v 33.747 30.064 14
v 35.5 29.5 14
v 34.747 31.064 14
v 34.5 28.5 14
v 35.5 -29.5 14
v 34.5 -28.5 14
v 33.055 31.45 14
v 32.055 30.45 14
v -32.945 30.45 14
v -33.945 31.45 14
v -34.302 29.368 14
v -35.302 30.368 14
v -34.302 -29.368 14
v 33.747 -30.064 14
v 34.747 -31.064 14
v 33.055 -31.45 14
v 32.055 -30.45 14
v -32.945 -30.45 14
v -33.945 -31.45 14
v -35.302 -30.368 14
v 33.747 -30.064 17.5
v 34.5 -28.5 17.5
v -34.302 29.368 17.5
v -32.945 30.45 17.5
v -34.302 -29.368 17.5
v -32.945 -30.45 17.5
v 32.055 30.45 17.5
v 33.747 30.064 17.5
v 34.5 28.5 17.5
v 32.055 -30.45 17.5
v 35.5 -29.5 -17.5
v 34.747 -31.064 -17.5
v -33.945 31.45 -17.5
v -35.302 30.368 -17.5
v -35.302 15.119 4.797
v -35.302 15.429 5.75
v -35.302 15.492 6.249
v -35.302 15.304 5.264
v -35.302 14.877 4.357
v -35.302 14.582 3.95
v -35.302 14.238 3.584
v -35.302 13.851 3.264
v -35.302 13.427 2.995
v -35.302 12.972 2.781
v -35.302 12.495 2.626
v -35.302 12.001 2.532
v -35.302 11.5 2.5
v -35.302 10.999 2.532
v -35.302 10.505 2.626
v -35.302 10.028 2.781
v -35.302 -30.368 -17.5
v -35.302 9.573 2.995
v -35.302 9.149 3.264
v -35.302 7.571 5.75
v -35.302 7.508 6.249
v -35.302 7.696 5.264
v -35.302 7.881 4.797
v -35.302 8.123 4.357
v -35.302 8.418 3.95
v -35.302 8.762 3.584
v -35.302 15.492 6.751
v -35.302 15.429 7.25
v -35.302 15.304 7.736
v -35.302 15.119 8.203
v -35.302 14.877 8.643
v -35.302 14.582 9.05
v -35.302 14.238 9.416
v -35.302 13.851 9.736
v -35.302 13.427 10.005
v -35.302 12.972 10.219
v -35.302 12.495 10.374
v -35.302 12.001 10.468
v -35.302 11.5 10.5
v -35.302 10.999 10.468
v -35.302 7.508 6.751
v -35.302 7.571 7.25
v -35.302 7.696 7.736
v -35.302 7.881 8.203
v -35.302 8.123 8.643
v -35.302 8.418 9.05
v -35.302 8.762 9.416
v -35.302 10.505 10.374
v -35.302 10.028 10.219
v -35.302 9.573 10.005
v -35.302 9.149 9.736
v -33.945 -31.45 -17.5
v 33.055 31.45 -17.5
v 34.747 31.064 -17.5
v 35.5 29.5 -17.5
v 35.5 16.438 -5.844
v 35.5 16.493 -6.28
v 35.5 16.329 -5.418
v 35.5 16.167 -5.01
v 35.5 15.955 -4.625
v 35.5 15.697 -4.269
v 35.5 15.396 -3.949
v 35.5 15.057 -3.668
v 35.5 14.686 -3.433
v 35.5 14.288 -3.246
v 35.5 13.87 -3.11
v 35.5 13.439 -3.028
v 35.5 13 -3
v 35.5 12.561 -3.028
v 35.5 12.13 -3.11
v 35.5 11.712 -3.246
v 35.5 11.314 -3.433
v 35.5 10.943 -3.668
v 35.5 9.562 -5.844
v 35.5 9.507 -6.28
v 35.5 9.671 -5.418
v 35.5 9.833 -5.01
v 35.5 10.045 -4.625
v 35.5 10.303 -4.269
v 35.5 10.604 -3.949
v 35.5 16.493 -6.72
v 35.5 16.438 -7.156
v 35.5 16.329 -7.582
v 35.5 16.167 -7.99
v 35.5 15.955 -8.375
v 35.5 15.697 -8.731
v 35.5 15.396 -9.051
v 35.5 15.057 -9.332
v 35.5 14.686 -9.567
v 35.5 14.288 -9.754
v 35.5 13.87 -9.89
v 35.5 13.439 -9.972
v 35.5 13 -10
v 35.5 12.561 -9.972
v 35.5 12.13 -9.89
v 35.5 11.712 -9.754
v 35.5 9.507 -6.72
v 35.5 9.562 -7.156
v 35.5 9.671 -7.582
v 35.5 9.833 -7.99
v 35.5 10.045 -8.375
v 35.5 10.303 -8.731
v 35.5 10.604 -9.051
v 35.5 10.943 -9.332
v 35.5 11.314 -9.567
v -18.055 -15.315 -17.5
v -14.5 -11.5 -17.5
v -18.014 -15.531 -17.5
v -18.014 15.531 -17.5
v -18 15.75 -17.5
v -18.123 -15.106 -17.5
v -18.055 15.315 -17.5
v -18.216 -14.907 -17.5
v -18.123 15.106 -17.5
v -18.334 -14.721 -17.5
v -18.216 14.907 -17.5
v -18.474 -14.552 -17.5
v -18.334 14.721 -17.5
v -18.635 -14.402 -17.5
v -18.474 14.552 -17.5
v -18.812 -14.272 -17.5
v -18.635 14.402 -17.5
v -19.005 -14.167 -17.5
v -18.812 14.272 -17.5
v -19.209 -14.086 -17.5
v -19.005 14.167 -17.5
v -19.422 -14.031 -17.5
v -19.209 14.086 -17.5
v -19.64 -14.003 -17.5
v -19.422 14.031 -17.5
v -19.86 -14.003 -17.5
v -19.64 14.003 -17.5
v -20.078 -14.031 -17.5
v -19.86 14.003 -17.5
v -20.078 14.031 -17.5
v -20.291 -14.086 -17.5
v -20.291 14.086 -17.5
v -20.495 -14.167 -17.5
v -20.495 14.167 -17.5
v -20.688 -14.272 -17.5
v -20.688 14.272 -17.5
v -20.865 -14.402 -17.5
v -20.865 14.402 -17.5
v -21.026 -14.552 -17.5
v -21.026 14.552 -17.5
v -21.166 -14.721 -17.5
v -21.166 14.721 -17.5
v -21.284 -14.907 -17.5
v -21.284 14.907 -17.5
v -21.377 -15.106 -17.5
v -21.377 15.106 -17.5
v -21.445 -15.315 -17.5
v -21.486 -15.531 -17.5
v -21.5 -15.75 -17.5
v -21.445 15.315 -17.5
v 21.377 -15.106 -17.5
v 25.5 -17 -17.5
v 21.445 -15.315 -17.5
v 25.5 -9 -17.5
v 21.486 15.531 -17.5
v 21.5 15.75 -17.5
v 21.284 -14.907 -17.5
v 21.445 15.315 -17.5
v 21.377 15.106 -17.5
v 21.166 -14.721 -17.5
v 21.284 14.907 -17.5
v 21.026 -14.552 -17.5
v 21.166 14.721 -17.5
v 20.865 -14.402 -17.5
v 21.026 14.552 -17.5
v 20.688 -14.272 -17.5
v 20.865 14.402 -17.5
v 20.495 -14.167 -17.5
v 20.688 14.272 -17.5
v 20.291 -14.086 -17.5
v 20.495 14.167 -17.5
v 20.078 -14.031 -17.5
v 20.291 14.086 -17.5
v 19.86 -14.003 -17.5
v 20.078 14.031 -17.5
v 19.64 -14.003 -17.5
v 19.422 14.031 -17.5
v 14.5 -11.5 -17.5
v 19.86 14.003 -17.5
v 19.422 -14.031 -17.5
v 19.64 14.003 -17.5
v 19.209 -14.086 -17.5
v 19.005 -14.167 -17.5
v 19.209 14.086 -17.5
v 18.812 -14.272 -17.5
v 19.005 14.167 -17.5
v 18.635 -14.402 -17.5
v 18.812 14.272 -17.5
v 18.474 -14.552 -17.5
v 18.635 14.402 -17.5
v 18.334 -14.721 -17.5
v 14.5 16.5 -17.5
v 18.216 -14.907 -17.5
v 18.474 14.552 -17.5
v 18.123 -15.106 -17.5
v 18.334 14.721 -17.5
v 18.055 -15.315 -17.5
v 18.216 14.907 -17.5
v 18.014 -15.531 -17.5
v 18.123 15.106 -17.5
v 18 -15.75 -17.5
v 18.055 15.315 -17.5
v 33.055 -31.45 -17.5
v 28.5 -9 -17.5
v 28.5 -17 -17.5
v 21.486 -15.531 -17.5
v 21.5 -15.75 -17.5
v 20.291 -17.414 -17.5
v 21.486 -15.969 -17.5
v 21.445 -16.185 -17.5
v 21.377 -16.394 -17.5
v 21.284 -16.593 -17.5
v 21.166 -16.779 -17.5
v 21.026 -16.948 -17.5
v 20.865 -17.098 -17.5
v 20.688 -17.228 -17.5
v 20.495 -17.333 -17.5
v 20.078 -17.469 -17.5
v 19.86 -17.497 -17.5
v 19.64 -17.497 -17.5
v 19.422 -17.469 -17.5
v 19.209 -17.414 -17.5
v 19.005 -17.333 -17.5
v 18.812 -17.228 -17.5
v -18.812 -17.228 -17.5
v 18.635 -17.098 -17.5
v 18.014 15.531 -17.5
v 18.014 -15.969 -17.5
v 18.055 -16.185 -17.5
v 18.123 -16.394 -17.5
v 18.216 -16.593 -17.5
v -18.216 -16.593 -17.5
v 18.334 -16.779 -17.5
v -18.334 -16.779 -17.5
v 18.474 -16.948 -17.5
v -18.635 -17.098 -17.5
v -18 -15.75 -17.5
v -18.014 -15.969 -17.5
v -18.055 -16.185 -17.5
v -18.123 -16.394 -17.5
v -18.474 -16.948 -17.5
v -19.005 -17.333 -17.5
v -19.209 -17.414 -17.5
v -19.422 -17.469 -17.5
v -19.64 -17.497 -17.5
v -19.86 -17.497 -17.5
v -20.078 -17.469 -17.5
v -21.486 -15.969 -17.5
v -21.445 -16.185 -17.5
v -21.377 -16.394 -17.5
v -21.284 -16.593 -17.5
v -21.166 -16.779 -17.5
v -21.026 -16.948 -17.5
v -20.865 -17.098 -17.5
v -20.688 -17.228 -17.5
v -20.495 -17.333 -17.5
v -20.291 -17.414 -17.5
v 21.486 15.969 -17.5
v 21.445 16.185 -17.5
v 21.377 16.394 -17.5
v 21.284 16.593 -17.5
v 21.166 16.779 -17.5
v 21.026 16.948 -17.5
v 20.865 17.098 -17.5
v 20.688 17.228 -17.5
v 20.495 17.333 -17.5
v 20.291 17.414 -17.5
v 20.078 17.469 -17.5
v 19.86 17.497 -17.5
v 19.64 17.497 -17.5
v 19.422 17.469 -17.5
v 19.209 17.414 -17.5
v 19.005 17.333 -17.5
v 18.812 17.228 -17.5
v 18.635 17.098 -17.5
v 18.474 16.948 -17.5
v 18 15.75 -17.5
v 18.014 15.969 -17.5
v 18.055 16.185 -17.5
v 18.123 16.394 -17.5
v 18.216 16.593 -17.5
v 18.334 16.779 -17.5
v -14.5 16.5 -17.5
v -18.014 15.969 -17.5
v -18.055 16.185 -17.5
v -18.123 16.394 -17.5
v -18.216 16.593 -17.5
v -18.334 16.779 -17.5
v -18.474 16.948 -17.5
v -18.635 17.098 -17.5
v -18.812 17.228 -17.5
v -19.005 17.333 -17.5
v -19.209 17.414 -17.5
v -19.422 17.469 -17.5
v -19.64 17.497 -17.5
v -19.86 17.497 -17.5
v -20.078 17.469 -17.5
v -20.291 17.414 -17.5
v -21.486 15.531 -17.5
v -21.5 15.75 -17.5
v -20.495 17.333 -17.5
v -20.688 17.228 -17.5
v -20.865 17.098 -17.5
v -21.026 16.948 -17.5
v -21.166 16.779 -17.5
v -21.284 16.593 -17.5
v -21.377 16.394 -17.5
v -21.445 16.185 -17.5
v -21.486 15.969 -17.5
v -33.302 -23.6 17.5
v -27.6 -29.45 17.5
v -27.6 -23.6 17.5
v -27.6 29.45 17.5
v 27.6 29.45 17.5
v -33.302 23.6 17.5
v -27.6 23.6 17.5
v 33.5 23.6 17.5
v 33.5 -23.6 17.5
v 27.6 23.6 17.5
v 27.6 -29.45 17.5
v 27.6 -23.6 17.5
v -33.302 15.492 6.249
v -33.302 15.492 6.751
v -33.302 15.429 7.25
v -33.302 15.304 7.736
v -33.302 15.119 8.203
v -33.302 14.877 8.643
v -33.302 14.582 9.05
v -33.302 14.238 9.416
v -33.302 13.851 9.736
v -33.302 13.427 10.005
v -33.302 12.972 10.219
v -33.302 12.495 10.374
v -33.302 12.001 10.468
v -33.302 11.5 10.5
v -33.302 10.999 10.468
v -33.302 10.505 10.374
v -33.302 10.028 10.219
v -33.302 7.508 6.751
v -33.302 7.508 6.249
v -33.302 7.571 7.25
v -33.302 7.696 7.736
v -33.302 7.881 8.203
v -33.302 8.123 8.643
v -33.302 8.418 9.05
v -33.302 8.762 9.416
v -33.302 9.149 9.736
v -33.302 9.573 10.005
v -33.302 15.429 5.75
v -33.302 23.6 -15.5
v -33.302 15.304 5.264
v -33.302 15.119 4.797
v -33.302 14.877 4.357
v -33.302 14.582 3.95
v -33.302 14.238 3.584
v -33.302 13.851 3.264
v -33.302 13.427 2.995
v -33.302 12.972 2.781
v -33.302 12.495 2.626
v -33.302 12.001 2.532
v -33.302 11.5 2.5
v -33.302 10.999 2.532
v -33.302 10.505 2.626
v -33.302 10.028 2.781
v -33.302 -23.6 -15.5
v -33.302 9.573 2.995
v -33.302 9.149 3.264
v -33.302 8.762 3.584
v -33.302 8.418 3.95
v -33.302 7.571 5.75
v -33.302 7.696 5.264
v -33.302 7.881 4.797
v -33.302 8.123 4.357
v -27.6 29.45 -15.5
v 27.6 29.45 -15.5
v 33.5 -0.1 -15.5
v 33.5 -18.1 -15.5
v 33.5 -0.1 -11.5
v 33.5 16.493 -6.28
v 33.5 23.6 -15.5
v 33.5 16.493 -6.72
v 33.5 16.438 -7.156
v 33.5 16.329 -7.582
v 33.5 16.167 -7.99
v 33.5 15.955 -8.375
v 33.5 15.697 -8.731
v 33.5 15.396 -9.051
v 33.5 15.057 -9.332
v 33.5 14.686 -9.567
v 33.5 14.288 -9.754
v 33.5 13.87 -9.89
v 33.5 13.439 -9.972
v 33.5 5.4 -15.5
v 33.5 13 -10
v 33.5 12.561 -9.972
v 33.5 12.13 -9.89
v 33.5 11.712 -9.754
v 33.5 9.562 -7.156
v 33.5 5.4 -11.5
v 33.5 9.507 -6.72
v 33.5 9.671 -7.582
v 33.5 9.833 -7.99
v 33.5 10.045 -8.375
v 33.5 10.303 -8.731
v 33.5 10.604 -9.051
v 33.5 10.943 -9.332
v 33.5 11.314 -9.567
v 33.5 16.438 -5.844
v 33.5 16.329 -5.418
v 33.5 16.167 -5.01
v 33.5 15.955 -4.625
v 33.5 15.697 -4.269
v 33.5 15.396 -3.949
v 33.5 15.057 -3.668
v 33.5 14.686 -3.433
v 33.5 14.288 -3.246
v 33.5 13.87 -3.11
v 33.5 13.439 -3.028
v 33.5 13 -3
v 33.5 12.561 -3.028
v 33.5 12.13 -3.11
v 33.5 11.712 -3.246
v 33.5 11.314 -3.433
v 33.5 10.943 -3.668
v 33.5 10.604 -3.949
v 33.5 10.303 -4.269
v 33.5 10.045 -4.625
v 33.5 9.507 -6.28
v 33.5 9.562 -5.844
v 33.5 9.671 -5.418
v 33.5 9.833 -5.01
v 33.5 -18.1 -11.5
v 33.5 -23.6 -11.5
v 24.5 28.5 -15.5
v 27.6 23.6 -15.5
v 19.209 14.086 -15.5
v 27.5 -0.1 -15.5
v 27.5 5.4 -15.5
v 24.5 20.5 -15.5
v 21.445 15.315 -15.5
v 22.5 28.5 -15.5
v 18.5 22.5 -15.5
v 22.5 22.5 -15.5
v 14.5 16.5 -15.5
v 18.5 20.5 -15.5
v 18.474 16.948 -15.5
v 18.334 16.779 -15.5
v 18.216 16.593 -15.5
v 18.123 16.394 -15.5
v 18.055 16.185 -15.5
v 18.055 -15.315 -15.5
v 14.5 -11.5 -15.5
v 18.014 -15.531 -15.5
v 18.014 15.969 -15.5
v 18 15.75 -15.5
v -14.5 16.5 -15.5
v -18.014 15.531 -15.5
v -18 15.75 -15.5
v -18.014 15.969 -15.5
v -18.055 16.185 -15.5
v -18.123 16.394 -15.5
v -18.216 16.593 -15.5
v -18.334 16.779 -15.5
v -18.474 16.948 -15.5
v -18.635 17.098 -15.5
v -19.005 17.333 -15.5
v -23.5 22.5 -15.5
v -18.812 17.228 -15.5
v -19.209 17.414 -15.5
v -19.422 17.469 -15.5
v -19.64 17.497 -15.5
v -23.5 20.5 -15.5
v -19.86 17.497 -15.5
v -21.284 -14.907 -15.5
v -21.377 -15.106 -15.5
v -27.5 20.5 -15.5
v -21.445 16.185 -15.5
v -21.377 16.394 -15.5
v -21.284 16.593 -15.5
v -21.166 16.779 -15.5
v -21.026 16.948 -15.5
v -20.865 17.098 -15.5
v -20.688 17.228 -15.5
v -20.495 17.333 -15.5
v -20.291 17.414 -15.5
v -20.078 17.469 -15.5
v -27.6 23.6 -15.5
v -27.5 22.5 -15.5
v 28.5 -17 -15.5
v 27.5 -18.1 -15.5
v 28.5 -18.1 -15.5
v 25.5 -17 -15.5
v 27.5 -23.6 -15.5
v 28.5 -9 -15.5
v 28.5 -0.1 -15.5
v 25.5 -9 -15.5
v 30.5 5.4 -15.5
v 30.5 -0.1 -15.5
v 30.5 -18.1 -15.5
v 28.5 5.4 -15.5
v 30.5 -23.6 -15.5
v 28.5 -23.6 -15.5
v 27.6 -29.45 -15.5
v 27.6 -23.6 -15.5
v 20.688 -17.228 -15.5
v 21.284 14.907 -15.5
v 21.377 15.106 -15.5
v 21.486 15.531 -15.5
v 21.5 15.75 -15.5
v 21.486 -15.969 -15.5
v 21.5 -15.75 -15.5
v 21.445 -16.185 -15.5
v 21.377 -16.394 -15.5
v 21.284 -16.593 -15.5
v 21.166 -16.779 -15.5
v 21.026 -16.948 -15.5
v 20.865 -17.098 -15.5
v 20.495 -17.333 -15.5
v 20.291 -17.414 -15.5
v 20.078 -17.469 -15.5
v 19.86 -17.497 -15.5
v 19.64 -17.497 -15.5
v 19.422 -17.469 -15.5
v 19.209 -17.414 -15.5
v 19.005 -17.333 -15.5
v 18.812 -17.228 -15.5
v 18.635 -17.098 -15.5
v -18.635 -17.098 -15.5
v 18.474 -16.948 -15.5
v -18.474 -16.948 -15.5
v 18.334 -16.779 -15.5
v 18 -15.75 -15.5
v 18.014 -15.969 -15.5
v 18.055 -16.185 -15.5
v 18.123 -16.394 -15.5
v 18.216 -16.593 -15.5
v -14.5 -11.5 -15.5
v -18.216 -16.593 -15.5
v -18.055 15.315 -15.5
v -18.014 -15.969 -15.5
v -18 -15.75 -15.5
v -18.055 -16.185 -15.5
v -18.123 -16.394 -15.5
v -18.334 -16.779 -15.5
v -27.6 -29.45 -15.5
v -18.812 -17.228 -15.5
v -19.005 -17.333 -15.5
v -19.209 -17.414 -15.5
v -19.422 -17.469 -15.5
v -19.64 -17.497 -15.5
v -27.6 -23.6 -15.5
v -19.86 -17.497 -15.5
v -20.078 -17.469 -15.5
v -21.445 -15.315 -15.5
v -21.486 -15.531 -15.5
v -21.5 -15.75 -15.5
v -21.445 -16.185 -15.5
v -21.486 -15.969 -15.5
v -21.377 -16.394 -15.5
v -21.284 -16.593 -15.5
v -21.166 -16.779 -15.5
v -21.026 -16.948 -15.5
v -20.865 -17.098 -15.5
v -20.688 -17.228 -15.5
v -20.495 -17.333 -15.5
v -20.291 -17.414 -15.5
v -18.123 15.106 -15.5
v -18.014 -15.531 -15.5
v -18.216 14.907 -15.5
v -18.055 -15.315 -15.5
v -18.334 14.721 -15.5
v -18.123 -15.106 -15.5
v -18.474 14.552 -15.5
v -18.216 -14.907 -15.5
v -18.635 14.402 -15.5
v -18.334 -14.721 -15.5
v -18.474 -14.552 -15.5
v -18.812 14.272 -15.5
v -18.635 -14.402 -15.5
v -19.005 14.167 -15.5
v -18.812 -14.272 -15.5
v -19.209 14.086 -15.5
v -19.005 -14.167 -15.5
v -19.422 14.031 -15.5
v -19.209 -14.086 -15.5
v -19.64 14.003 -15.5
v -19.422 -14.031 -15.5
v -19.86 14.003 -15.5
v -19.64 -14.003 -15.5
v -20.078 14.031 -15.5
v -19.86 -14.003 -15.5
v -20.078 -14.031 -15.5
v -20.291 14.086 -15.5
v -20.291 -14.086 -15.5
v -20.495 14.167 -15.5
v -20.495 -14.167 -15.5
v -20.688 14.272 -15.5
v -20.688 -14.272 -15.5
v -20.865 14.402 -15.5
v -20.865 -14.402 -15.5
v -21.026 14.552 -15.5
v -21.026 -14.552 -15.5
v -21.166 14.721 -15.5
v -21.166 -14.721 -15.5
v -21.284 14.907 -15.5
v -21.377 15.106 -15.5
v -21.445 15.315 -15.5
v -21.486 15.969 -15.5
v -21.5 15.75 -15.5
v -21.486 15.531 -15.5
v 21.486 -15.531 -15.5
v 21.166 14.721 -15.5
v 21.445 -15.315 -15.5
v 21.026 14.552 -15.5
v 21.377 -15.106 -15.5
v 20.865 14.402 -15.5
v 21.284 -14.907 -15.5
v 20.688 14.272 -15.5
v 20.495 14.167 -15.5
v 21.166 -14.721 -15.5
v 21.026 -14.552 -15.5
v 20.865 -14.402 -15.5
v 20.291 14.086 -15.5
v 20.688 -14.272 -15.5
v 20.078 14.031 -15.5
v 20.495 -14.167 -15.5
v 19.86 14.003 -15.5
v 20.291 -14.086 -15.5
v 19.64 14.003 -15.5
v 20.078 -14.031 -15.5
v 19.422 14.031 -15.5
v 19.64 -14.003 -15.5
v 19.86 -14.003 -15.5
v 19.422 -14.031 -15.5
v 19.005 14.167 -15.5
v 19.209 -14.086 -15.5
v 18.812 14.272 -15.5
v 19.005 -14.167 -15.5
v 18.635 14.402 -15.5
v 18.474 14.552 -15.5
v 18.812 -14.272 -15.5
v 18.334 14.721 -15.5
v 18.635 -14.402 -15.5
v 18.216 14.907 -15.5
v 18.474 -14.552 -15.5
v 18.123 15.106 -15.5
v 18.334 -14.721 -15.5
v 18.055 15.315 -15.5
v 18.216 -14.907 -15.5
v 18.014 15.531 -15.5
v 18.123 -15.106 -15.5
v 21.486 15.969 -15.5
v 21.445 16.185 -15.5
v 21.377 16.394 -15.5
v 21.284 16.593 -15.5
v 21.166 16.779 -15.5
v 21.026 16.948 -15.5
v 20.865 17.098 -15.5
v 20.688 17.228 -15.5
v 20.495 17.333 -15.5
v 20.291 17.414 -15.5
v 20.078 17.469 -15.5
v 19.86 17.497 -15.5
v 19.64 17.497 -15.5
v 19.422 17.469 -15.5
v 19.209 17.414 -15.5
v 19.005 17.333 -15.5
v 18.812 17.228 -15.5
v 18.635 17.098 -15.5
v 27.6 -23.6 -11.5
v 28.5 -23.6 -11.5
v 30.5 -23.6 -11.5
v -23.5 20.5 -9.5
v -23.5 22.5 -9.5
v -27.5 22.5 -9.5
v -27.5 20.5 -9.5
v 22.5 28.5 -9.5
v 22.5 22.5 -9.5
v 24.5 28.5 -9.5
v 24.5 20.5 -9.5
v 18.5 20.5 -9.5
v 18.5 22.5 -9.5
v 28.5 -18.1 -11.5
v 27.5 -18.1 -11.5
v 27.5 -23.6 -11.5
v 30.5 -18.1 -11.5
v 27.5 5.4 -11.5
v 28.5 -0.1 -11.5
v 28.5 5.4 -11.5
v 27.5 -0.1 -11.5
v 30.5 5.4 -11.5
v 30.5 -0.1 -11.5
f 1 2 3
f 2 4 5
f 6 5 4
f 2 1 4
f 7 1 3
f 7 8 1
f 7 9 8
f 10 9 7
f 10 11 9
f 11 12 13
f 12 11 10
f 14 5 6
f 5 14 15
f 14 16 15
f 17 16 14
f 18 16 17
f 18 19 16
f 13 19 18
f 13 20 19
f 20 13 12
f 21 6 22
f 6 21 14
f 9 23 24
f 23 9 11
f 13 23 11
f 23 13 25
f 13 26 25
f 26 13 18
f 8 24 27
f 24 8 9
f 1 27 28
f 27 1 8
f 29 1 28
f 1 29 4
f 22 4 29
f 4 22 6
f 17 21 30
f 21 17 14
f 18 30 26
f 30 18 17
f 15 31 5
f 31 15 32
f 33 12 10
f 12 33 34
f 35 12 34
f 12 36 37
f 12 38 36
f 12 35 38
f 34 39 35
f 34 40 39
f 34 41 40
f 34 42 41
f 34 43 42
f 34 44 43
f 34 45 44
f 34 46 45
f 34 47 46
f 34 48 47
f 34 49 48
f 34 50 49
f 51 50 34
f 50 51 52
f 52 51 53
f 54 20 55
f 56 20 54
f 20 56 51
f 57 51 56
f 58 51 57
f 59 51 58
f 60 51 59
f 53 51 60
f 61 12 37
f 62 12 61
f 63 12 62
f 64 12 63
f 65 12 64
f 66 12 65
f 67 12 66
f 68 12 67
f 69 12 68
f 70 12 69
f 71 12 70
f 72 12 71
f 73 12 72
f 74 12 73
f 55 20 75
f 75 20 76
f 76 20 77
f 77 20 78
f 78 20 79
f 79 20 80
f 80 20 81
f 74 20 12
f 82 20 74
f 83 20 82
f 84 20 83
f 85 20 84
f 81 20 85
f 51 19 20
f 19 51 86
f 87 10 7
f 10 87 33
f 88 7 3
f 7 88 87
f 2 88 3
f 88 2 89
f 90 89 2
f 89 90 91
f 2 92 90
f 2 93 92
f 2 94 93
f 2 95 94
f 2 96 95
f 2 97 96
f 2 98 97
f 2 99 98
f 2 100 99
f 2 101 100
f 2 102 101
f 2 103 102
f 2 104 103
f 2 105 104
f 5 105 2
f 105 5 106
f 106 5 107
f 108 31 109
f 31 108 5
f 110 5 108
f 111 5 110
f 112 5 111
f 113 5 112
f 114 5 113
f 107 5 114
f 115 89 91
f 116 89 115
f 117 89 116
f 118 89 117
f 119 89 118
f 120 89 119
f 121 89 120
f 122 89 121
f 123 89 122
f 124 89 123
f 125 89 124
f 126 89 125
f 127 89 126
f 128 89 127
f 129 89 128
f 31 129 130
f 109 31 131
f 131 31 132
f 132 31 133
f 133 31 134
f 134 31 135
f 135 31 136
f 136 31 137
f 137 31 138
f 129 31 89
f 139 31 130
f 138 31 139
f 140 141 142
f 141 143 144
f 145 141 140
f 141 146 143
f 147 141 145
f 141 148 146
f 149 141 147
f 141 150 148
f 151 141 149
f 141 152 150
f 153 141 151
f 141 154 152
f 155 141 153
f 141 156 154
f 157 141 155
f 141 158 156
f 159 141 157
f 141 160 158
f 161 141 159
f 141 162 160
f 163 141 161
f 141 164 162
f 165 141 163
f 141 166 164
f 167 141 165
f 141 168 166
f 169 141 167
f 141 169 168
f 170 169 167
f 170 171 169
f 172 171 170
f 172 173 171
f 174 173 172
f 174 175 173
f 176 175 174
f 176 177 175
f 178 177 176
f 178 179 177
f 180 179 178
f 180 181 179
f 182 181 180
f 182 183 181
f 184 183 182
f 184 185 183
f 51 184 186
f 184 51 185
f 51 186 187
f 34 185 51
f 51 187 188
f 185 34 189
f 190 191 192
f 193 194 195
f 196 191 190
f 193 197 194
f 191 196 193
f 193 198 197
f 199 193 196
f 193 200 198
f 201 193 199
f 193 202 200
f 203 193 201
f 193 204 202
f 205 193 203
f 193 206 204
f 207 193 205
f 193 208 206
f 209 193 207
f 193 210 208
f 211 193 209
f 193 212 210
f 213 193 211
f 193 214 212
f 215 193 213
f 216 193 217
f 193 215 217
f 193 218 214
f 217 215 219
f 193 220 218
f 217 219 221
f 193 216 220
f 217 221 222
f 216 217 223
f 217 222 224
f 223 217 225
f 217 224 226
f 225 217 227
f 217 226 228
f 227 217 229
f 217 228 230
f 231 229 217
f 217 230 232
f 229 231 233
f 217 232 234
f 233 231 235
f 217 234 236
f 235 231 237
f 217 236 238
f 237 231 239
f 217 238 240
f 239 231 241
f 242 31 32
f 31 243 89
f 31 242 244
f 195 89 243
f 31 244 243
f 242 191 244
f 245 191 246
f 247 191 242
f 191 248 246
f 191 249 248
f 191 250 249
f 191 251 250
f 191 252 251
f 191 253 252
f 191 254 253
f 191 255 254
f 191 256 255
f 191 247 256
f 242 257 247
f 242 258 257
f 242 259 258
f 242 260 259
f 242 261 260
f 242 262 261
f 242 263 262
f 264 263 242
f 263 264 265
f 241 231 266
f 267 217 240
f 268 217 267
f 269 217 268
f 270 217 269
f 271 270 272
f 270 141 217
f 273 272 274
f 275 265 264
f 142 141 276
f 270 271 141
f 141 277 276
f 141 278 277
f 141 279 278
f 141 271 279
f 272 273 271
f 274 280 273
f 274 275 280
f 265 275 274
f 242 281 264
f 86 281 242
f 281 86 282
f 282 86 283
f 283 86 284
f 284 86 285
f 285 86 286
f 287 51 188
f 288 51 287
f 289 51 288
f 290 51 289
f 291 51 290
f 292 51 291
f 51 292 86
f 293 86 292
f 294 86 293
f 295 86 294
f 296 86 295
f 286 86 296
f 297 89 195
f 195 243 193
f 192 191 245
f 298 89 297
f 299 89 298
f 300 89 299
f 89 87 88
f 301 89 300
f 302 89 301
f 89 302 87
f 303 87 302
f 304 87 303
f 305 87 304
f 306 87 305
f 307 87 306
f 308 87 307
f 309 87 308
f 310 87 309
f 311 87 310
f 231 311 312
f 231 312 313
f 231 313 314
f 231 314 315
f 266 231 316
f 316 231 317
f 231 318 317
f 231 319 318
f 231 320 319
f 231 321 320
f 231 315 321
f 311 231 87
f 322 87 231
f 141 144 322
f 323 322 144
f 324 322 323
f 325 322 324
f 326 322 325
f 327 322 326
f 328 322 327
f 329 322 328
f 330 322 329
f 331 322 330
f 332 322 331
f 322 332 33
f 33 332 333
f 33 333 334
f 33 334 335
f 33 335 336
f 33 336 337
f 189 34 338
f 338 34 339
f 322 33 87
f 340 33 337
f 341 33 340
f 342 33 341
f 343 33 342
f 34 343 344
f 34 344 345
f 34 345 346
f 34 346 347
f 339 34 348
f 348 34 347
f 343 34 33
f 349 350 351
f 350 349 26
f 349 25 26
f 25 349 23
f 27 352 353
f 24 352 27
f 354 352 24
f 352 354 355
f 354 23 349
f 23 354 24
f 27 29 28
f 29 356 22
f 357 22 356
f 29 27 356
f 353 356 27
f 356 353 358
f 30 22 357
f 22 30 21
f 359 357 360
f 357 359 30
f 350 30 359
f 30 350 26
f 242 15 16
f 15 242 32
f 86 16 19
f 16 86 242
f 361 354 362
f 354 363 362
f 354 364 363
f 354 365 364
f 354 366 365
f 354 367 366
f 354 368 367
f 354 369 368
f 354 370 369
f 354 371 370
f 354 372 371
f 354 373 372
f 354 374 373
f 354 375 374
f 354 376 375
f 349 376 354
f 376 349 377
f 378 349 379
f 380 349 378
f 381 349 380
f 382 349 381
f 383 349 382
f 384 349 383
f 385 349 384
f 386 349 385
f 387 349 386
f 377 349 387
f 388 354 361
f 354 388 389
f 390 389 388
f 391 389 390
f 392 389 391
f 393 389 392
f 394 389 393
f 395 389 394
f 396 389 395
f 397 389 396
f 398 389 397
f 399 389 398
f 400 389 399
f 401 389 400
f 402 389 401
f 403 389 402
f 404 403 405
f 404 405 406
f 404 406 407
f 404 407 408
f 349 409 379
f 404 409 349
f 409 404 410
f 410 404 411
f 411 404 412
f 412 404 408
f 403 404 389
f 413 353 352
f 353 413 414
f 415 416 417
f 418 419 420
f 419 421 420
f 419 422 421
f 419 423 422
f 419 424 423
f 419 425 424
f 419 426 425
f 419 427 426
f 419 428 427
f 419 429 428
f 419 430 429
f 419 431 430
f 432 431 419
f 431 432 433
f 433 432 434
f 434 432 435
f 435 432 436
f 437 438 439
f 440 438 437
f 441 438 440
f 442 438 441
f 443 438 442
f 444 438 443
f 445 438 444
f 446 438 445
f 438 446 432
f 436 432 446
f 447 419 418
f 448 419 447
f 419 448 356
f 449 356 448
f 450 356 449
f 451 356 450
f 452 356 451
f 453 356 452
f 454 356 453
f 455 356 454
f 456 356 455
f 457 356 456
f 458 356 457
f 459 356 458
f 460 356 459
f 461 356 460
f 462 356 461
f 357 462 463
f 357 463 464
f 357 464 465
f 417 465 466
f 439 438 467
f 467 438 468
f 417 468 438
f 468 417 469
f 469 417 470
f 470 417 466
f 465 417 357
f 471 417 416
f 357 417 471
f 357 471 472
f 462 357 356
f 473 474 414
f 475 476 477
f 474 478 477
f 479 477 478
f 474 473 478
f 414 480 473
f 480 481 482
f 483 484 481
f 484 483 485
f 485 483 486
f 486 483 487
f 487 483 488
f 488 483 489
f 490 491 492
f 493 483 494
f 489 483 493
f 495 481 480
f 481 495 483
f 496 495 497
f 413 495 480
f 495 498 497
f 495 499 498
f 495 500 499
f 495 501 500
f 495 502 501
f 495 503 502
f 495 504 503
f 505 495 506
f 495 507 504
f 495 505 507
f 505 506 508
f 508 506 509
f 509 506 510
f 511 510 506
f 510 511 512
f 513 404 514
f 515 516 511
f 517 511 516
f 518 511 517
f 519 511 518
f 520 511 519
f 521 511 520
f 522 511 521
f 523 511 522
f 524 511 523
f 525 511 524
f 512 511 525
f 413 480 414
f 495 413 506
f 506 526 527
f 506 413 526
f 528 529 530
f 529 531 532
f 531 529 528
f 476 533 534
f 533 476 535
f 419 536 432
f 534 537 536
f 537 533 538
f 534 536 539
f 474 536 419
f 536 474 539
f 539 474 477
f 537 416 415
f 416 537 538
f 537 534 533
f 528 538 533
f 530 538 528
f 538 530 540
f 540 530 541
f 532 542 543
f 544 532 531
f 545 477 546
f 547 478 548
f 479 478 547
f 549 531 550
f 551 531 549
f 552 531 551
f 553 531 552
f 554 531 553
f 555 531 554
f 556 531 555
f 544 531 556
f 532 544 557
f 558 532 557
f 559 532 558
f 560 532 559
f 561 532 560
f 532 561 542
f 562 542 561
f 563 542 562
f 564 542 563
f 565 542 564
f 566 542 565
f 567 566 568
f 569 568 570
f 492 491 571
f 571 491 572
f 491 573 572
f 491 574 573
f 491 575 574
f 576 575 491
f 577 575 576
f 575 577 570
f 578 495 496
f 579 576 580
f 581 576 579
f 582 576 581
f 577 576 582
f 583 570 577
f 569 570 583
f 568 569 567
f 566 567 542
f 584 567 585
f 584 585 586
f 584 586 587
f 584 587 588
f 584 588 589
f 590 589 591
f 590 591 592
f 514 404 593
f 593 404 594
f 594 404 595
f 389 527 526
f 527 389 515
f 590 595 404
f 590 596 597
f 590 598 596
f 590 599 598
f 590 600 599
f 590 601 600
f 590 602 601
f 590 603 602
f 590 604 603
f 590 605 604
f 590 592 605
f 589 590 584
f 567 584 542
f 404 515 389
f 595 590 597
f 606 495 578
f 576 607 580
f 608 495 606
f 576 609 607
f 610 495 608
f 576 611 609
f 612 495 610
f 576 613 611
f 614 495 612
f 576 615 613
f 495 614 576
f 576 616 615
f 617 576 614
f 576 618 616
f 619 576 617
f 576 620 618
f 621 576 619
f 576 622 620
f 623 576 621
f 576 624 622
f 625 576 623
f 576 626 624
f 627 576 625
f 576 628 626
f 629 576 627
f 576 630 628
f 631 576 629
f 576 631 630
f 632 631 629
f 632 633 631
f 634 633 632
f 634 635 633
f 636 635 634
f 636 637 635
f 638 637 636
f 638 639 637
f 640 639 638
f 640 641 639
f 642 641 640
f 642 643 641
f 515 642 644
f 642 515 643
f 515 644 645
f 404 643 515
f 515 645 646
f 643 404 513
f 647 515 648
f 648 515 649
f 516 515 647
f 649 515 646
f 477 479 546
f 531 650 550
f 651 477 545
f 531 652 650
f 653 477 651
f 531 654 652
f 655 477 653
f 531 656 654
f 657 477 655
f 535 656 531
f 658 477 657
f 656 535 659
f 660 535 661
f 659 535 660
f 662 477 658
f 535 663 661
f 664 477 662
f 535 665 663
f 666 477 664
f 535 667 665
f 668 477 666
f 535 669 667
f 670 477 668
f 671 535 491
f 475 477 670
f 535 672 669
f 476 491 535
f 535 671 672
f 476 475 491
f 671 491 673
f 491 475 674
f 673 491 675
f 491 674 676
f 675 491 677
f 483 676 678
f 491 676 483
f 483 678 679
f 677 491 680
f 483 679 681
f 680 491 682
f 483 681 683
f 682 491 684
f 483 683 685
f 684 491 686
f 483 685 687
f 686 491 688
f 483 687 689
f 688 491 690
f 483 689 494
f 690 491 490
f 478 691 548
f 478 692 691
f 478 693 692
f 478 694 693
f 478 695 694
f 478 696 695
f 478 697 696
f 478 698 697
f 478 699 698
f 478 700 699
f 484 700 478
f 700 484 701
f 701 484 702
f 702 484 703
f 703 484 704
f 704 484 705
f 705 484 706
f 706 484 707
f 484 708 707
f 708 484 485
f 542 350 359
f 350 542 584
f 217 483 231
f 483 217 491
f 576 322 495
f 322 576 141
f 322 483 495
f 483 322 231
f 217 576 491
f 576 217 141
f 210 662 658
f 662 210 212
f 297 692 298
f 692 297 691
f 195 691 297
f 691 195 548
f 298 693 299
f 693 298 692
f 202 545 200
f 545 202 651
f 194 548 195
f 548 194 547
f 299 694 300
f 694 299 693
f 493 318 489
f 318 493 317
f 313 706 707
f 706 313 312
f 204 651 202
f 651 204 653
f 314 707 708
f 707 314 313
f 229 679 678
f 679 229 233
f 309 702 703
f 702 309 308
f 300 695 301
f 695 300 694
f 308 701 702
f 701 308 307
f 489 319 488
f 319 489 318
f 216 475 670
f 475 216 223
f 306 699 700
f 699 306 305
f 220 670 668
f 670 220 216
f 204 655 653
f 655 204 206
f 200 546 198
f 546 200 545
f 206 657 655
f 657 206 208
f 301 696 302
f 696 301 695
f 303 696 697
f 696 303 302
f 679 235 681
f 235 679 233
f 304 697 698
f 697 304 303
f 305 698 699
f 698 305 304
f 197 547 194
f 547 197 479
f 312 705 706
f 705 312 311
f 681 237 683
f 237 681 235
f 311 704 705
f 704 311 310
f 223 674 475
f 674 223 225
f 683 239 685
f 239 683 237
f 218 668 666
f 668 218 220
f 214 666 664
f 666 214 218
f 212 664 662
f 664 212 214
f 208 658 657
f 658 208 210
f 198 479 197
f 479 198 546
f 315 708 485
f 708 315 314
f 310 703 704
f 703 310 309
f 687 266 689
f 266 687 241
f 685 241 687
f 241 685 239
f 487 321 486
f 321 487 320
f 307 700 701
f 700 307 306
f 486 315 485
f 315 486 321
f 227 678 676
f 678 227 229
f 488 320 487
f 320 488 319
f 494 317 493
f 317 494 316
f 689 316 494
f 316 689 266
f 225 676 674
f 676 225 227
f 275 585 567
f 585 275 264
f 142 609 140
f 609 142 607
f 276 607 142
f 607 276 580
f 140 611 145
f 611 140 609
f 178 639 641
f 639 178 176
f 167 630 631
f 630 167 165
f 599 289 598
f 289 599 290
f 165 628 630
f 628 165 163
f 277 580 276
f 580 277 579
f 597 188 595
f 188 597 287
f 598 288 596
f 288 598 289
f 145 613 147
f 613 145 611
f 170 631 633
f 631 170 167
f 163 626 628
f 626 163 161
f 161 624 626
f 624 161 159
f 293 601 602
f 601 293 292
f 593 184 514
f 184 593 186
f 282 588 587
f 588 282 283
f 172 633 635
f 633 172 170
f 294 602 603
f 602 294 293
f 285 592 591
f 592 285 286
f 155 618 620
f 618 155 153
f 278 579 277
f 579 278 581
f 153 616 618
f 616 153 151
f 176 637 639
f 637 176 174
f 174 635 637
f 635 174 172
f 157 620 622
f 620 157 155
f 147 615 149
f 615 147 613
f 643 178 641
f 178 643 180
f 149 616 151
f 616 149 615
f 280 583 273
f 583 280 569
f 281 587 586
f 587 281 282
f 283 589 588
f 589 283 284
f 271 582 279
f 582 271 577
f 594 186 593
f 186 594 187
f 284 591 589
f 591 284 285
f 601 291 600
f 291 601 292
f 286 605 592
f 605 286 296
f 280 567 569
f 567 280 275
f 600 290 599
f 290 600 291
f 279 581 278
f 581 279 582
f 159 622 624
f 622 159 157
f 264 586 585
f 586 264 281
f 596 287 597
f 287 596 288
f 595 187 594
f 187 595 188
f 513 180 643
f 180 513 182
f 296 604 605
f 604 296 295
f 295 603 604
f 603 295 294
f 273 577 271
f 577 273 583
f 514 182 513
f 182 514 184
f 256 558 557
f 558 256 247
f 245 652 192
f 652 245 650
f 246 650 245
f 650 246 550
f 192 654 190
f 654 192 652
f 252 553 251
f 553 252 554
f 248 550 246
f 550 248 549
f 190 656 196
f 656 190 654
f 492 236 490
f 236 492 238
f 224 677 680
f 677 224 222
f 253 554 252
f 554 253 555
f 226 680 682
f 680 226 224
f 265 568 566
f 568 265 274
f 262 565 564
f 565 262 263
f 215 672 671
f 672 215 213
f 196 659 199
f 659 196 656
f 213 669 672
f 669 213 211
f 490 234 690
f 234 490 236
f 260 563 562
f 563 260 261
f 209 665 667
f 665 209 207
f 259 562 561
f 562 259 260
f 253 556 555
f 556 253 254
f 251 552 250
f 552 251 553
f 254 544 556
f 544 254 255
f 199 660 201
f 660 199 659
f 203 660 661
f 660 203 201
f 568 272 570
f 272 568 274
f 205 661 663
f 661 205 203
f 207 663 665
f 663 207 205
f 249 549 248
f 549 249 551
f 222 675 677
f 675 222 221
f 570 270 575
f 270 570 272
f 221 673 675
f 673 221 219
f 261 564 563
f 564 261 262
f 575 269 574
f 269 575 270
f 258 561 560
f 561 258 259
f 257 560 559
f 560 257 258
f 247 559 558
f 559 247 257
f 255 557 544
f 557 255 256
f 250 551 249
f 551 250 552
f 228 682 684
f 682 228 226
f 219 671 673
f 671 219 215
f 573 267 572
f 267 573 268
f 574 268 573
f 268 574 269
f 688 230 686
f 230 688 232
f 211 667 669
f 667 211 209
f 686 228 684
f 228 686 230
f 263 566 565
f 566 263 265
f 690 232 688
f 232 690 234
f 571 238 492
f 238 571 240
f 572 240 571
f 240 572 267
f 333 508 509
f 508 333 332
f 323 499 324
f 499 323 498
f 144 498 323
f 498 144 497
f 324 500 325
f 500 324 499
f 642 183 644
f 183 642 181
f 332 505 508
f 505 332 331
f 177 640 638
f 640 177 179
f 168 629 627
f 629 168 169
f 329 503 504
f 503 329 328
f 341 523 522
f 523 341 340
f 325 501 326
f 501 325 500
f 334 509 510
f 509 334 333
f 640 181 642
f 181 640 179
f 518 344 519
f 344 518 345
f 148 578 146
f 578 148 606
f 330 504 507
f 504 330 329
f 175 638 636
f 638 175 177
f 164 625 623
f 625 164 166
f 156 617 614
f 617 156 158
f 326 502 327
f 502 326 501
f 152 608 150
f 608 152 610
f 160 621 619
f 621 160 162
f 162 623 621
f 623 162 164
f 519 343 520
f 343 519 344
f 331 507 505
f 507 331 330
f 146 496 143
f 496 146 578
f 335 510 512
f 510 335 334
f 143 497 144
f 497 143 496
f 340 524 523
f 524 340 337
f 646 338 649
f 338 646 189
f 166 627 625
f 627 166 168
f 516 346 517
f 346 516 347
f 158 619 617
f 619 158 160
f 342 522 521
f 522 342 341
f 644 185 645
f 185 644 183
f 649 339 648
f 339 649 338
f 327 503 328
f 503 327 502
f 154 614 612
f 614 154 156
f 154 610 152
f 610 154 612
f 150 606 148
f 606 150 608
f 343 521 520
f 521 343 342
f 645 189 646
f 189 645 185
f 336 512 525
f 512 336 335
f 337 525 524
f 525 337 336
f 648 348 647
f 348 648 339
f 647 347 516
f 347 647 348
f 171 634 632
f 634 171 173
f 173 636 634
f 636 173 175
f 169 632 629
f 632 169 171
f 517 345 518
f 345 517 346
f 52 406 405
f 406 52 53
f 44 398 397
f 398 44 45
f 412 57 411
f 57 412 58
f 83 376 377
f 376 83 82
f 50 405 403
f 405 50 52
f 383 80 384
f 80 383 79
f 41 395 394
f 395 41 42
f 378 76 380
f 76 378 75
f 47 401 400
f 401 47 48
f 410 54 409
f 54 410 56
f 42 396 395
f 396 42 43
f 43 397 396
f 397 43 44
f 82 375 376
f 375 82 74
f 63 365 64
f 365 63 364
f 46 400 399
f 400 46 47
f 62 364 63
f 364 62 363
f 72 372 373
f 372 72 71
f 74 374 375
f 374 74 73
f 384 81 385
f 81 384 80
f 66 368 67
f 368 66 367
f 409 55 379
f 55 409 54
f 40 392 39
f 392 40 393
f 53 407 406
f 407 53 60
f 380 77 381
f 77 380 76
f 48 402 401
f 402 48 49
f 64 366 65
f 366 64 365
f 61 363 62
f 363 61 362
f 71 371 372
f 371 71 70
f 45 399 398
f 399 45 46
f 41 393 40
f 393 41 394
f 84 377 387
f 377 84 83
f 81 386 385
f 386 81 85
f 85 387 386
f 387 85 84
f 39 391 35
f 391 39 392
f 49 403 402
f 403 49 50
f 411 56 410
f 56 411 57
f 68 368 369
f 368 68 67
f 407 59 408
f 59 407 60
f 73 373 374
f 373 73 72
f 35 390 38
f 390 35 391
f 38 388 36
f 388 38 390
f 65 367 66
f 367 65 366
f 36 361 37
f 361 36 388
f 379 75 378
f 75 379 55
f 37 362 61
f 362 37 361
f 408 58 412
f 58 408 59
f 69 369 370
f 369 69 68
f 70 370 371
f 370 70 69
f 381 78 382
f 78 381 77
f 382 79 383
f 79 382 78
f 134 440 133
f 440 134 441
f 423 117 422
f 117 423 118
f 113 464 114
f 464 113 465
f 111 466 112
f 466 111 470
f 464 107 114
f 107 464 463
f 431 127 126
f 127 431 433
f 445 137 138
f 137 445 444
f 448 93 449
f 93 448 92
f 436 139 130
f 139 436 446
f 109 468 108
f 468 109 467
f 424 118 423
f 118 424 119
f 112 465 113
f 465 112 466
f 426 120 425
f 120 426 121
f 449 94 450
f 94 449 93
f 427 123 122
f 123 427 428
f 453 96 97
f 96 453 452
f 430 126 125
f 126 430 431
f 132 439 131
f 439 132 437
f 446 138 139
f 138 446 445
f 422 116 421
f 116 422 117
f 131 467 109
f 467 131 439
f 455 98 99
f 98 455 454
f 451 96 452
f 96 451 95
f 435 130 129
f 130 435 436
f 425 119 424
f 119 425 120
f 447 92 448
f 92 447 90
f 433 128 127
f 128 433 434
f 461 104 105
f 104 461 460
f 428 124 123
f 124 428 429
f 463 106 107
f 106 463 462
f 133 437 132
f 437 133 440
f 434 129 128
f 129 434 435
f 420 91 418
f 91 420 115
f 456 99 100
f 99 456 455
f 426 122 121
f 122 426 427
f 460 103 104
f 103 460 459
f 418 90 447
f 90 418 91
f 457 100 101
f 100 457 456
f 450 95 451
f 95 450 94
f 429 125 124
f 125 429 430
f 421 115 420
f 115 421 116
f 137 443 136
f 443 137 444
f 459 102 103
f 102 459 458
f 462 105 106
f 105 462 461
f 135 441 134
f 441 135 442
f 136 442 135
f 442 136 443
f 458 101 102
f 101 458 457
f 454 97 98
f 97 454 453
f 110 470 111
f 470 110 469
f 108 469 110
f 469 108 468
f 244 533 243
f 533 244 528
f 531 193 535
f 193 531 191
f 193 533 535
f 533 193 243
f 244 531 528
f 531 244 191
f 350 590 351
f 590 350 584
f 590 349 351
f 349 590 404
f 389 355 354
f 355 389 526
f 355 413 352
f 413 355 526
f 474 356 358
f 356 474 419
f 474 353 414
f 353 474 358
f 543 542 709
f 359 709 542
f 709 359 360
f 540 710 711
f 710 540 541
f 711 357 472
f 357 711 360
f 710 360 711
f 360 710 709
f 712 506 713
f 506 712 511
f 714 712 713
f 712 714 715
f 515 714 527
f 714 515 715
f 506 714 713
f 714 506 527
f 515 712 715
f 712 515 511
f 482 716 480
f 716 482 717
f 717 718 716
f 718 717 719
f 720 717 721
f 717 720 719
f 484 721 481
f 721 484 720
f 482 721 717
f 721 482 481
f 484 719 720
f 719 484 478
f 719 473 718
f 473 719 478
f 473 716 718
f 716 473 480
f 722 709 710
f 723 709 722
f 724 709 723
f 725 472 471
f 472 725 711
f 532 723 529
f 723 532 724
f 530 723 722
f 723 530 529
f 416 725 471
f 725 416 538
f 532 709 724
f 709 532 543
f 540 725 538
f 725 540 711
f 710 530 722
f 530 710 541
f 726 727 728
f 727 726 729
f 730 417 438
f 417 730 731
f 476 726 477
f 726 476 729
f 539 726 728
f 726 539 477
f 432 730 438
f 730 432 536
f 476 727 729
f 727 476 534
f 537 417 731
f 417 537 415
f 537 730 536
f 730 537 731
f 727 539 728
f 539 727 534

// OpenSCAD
module box(width, height, depth, thickness, endingThickness, endingDepth, rdiam) {
    difference() {
        roundedCube(width, height, depth, rdiam);
        translate([0, 0, thickness]) roundedCube(width - thickness * 2, height - thickness * 2, depth, rdiam);
        translate([0, 0, (depth - endingDepth) / 2])
        difference() {
            roundedCube(width + 1, height + 1, endingDepth + 1, rdiam);
            roundedCube(width - thickness * 2 + endingThickness * 2, height - thickness * 2 + endingThickness * 2, endingDepth + 1, rdiam);
        };
    };
    
        
}

module roundedCube(width, height, depth, diam) {
    dwidth = width - diam;
    dheight = height - diam;
    
    hull() {
        translate([- dwidth / 2, - dheight / 2, 0]) cylinder(h = depth, d = diam, center = true);
        translate([dwidth / 2, dheight / 2, 0]) cylinder(h = depth, d = diam, center = true);
        translate([- dwidth / 2, dheight / 2, 0]) cylinder(h = depth, d = diam, center = true);
        translate([dwidth / 2, - dheight / 2, 0]) cylinder(h = depth, d = diam, center = true);
    }
}

module screws(width, height, depth, diam, screw) {
    fuse = 0.1;
    
    translate([- (width - screw) / 2 - fuse, - (height - screw) / 2 - fuse, 0]) 
    screwSupport(screw, screw, depth, diam);
    
    rotate(-90) 
    translate([- (height - screw) / 2 - fuse, - (width - screw) / 2 - fuse, 0]) 
    screwSupport(screw, screw, depth, diam);
    
    rotate(-180) 
    translate([- (width - screw) / 2 - fuse, - (height - screw) / 2 - fuse, 0]) 
    screwSupport(screw, screw, depth, diam);
    
    rotate(-270) 
    translate([- (height - screw) / 2 - fuse, - (width - screw) / 2 - fuse, 0]) 
    screwSupport(screw, screw, depth, diam);
}

module screwSupport(width, height, depth, diam) {
    $fn = 50;
    
    dwidth = width - diam;
    dheight = height - diam;
    
    hull() {
        translate([- dwidth / 2, - dheight / 2, 0]) cylinder(h = depth, d = diam, center = true);
        translate([dwidth / 2, dheight / 2, 0]) cube([diam, diam, depth], center = true);
        translate([- dwidth / 2, dheight / 2, 0]) cube([diam, diam, depth], center = true);
        translate([dwidth / 2, - dheight / 2, 0]) cube([diam, diam, depth], center = true);
    }
    //cube([width, height, depth], center = true);
}

module battery(
    width, 
    height, 
    depth, 
    batteryWidth,
    batteryHeight,
    batteryThickness, 
    supportThickness,
    screw,
    depthOffset
) {
    pdepth = depth - depthOffset;
    supWidth = supportThickness * 2;
    supHeight = supportThickness;
    supDepth = supportThickness * 3;
    
    translate([
        - (width - supWidth) / 2 + screw, 
        + (height - supHeight) / 2 - batteryThickness, 
        - (depth - supDepth) / 2
    ])
    cube([supWidth, supHeight, supDepth], center = true);

    translate([
        - (width - supWidth) / 2 + screw + batteryWidth - supWidth, 
        + (height - supHeight) / 2 - batteryThickness, 
        - (depth - supDepth) / 2
    ])
    cube([supWidth, supHeight, supDepth], center = true);

    translate([
        - (width - supHeight) / 2 + screw + batteryWidth,
        + (height - supHeight + screw) / 2 - batteryThickness, 
        - (depth - supDepth) / 2
    ])
    cube(
        [supHeight, supportThickness + screw, supDepth], 
        center = true);
    
//    translate([+ (iwidth - screw * 2 - thickness) / 2, - (iheight - screw * 2 - thickness) / 2 - 1, - (depth - screw) / 2 + thickness])
//    batterySupport(screw, thickness, screw);

//    translate([0, - (iheight - screw * 3) / 2 - 1, - depthOffset / 2])
//    cube([screw, screw, pdepth], center = true);
}

module screenDrill(
    width, 
    height, 
    depth, 
    pcbWidth, 
    pcbHeight, 
    leftInset, 
    rightInset, 
    topInset, 
    bottomInset,
    screwsInset,
    screwsDiam
) {
    $fn = 50;
    
    screenWidth = pcbWidth - leftInset - rightInset;
    screenHeight = pcbHeight - topInset - bottomInset;
    drill = 20;
    
    translate([(leftInset - rightInset) / 2, (bottomInset - topInset) / 2, - depth / 2])
    cube([screenWidth, screenHeight, drill], center = true);
    
    translate([(pcbWidth - screwsDiam) / 2 - 1, (pcbHeight - screwsDiam) / 2 - 1, - depth / 2])
    cylinder(h = drill, d = screwsDiam, center = true);

    translate([- (pcbWidth - screwsDiam) / 2 + 1, - (pcbHeight - screwsDiam) / 2 + 1, - depth / 2])
    cylinder(h = drill, d = screwsDiam, center = true);

    translate([+ (pcbWidth - screwsDiam) / 2 - 1, - (pcbHeight - screwsDiam) / 2 + 1, - depth / 2])
    cylinder(h = drill, d = screwsDiam, center = true);

    translate([- (pcbWidth - screwsDiam) / 2 + 1, + (pcbHeight - screwsDiam) / 2 - 1, - depth / 2])
    cylinder(h = drill, d = screwsDiam, center = true);
}

module rollerDrill(
    width,
    height,
    depth,
    leftOffs,
    bottomOffs,
    pcbWidth,
    pcbHeight,
    leftInset, 
    topInset, 
    rollerDiam
) {
    $fn = 50;
    
    drill = 20;

    rotate([0, 90, 0])
    translate([depth / 2 - leftInset + 1 - bottomOffs, height / 2 - leftOffs + 1 - topInset, - width / 2])
    cylinder(h = drill, d = rollerDiam, center = true);
}

module antennaDrill(
    width,
    height,
    depth,
    leftOffs,
    diam,
    inset
) {
    $fn = 50;
    
    drill = 20;

    rotate([0, 90, 0])
    translate([depth / 2 - inset + 1 - diam, height / 2 - diam / 2 - inset - leftOffs, + width  / 2])
    cylinder(h = drill, d = diam, center = true);
}

module mainPcb(
    width,
    height,
    depth,
    supportThickness,
    screw,
    pcbWidth,
    pcbHeight,
    pcbThickness,
    pcbUsbWidth,
    pcbUsbHeight,
    pcbUsbInset,
    pcbScrewInset,
    pcbScrewDiam,
    pcbWallOffset
) {
    supWidth = pcbThickness + pcbWallOffset + 1;
    supHeight = pcbScrewDiam + pcbScrewInset * 2;
    supDepth = supportThickness * 2;
    
    translate([
        + (width - supWidth) / 2, 
        - (height - supHeight) / 2 + screw - 0.1, 
        - (depth - supDepth) / 2
    ])
    difference() {
        cube([supWidth, supHeight, supDepth], center = true);
        translate([-1, 0, 0])
        cube([pcbThickness, supHeight + 0.1, supDepth + 0.1], center = true);
    }

    translate([
        + (width - supWidth) / 2, 
        - (height - supHeight) / 2 + screw - 0.1 + pcbWidth - supHeight,
        - (depth - supDepth) / 2
    ])
    difference() {
        cube([supWidth, supHeight, supDepth], center = true);
        translate([-1, 0, 0])
        cube([pcbThickness, supHeight + 0.1, supDepth + 0.1], center = true);
    }

//    translate([(iwidth - supWidth) / 2, - (iheight - supHeight) / 2 + screw - 1, - (depth - supDepth) / 2 + thickness])
//    difference() {
//        cube([supWidth * 2, supHeight * 2, supDepth], center = true);
//        cube([pcbTickness, supHeight * 2, supDepth], center = true);
//    }
}

module mainPcbDrill(
    width,
    height,
    depth,
    supportThickness,
    screw,
    pcbWidth,
    pcbHeight,
    pcbThickness,
    pcbUsbWidth,
    pcbUsbHeight,
    pcbUsbInset,
    pcbScrewInset,
    pcbScrewDiam,
    pcbWallOffset
) {
    drill = 20;
    
    supWidth = pcbThickness + pcbWallOffset + 1;
    supHeight = pcbScrewDiam + pcbScrewInset * 2;
    supDepth = supportThickness * 2;
    
    translate([
        (width - pcbUsbHeight)/2 - pcbWallOffset - pcbThickness,
        - (height - pcbUsbWidth) / 2 + screw + supHeight + pcbUsbInset,
        - depth / 2,
    ])
    cube([pcbUsbHeight, pcbUsbWidth, drill], center = true);
}

module wm(
    width, 
    height, 
    depth, 
    thickness, 
    endingThickness, 
    endingDepth, 
    diam, 
    screw, 
    depthOffset,
    screenPcbWidth,
    screenPcbHeight,
    screenPcbTotalThickness,
    screenLeftInset, 
    screenRightInset, 
    screenTopInset, 
    screenBottomInset,
    screenScrewsInset,
    screenScrewsDiam,
    rollerPcbWidth,
    rollerPcbHeight,
    rollerLeftInset, 
    rollerTopInset, 
    rollerDiam,
    antennaDiam,
    antennaInset,
    batteryWidth,
    batteryHeight,
    batteryThickness,
    batterySupportThickness,
    mainPcbWidth, 
    mainPcbHeight, 
    mainPcbTickness,
    mainPcbUsbWidth,
    mainPcbUsbHeight,
    mainPcbUsbInset,
    mainPcbScrewInset,
    mainPcbScrewDiam,
    mainPcbWallOffset
) {
    
    iwidth = width - thickness * 2;
    iheight = height - thickness * 2;
    idepth = depth - thickness * 2;
    
    difference() {
        box(width, height, depth, thickness, endingThickness, endingDepth, diam);

        screenDrill(
            iwidth, 
            iheight, 
            idepth, 
            screenPcbWidth, 
            screenPcbHeight,
            screenLeftInset,
            screenRightInset,
            screenTopInset,
            screenBottomInset,
            screenScrewsInset,
            screenScrewsDiam
        );
        
        rollerDrill(
            iwidth,
            iheight,
            idepth,
            batteryThickness + batterySupportThickness + 1,
            screenPcbTotalThickness + 1,
            rollerPcbWidth, 
            rollerPcbHeight,
            rollerLeftInset,
            rollerTopInset,
            rollerDiam
        );
        
        antennaDrill(
            iwidth,
            iheight,
            idepth,
            batteryThickness + batterySupportThickness + 1,
            antennaDiam,
            antennaInset
        );
    
        mainPcbDrill(
            iwidth, 
            iheight, 
            idepth, 
            batterySupportThickness,
            screw,
            mainPcbWidth, 
            mainPcbHeight, 
            mainPcbTickness,
            mainPcbUsbWidth,
            mainPcbUsbHeight,
            mainPcbUsbInset,
            mainPcbScrewInset,
            mainPcbScrewDiam,
            mainPcbWallOffset
        );
    }
    
    screws(iwidth, iheight, depth, diam, screw);
    
    battery(
        iwidth, 
        iheight, 
        idepth, 
        batteryWidth,
        batteryHeight,
        batteryThickness, 
        batterySupportThickness, 
        screw, 
        depthOffset
    );
    
    mainPcb(
        iwidth, 
        iheight, 
        idepth, 
        batterySupportThickness,
        screw,
        mainPcbWidth, 
        mainPcbHeight, 
        mainPcbTickness,
        mainPcbUsbWidth,
        mainPcbUsbHeight,
        mainPcbUsbInset,
        mainPcbScrewInset,
        mainPcbScrewDiam,
        mainPcbWallOffset
    );
}

wm(
    width = 71,
    height = 63,
//    50, // depth
    depth = 35,
    thickness = 2,
    endingThickness = 1,
    endingDepth = 3,
    diam = 4,
    screw = 6,
    depthOffset = 10,
    screenPcbWidth = 45,
    screenPcbHeight = 37,
    screenPcbTotalThickness = 10,
    screenLeftInset = 8,
    screenRightInset = 8,
    screenTopInset = 2,
    screenBottomInset = 7,
    screenScrewsInset = 1,
    screenScrewsDiam = 3.5, // Extra 0.5 for the board to fit
    rollerPcbWidth = 26,
    rollerPcbHeight = 20,
    rollerLeftInset = 12,
    rollerTopInset = 9,
    rollerDiam = 8,
    antennaDiam = 7,
    antennaInset = 3,
    batteryWidth = 50,
    batteryHeight = 60,
    batteryThickness = 7,
    batterySupportThickness = 2,
    mainPcbWidth = 29,
    mainPcbHeight = 58,
    mainPcbTickness = 2,
    mainPcbUsbWidth = 8,
    mainPcbUsbHeight = 3,
    mainPcbUsbInset = 1,
    mainPcbScrewInset = 1,
    mainPcbScrewDiam = 3.5,
    mainPcbWallOffset = 3
);
